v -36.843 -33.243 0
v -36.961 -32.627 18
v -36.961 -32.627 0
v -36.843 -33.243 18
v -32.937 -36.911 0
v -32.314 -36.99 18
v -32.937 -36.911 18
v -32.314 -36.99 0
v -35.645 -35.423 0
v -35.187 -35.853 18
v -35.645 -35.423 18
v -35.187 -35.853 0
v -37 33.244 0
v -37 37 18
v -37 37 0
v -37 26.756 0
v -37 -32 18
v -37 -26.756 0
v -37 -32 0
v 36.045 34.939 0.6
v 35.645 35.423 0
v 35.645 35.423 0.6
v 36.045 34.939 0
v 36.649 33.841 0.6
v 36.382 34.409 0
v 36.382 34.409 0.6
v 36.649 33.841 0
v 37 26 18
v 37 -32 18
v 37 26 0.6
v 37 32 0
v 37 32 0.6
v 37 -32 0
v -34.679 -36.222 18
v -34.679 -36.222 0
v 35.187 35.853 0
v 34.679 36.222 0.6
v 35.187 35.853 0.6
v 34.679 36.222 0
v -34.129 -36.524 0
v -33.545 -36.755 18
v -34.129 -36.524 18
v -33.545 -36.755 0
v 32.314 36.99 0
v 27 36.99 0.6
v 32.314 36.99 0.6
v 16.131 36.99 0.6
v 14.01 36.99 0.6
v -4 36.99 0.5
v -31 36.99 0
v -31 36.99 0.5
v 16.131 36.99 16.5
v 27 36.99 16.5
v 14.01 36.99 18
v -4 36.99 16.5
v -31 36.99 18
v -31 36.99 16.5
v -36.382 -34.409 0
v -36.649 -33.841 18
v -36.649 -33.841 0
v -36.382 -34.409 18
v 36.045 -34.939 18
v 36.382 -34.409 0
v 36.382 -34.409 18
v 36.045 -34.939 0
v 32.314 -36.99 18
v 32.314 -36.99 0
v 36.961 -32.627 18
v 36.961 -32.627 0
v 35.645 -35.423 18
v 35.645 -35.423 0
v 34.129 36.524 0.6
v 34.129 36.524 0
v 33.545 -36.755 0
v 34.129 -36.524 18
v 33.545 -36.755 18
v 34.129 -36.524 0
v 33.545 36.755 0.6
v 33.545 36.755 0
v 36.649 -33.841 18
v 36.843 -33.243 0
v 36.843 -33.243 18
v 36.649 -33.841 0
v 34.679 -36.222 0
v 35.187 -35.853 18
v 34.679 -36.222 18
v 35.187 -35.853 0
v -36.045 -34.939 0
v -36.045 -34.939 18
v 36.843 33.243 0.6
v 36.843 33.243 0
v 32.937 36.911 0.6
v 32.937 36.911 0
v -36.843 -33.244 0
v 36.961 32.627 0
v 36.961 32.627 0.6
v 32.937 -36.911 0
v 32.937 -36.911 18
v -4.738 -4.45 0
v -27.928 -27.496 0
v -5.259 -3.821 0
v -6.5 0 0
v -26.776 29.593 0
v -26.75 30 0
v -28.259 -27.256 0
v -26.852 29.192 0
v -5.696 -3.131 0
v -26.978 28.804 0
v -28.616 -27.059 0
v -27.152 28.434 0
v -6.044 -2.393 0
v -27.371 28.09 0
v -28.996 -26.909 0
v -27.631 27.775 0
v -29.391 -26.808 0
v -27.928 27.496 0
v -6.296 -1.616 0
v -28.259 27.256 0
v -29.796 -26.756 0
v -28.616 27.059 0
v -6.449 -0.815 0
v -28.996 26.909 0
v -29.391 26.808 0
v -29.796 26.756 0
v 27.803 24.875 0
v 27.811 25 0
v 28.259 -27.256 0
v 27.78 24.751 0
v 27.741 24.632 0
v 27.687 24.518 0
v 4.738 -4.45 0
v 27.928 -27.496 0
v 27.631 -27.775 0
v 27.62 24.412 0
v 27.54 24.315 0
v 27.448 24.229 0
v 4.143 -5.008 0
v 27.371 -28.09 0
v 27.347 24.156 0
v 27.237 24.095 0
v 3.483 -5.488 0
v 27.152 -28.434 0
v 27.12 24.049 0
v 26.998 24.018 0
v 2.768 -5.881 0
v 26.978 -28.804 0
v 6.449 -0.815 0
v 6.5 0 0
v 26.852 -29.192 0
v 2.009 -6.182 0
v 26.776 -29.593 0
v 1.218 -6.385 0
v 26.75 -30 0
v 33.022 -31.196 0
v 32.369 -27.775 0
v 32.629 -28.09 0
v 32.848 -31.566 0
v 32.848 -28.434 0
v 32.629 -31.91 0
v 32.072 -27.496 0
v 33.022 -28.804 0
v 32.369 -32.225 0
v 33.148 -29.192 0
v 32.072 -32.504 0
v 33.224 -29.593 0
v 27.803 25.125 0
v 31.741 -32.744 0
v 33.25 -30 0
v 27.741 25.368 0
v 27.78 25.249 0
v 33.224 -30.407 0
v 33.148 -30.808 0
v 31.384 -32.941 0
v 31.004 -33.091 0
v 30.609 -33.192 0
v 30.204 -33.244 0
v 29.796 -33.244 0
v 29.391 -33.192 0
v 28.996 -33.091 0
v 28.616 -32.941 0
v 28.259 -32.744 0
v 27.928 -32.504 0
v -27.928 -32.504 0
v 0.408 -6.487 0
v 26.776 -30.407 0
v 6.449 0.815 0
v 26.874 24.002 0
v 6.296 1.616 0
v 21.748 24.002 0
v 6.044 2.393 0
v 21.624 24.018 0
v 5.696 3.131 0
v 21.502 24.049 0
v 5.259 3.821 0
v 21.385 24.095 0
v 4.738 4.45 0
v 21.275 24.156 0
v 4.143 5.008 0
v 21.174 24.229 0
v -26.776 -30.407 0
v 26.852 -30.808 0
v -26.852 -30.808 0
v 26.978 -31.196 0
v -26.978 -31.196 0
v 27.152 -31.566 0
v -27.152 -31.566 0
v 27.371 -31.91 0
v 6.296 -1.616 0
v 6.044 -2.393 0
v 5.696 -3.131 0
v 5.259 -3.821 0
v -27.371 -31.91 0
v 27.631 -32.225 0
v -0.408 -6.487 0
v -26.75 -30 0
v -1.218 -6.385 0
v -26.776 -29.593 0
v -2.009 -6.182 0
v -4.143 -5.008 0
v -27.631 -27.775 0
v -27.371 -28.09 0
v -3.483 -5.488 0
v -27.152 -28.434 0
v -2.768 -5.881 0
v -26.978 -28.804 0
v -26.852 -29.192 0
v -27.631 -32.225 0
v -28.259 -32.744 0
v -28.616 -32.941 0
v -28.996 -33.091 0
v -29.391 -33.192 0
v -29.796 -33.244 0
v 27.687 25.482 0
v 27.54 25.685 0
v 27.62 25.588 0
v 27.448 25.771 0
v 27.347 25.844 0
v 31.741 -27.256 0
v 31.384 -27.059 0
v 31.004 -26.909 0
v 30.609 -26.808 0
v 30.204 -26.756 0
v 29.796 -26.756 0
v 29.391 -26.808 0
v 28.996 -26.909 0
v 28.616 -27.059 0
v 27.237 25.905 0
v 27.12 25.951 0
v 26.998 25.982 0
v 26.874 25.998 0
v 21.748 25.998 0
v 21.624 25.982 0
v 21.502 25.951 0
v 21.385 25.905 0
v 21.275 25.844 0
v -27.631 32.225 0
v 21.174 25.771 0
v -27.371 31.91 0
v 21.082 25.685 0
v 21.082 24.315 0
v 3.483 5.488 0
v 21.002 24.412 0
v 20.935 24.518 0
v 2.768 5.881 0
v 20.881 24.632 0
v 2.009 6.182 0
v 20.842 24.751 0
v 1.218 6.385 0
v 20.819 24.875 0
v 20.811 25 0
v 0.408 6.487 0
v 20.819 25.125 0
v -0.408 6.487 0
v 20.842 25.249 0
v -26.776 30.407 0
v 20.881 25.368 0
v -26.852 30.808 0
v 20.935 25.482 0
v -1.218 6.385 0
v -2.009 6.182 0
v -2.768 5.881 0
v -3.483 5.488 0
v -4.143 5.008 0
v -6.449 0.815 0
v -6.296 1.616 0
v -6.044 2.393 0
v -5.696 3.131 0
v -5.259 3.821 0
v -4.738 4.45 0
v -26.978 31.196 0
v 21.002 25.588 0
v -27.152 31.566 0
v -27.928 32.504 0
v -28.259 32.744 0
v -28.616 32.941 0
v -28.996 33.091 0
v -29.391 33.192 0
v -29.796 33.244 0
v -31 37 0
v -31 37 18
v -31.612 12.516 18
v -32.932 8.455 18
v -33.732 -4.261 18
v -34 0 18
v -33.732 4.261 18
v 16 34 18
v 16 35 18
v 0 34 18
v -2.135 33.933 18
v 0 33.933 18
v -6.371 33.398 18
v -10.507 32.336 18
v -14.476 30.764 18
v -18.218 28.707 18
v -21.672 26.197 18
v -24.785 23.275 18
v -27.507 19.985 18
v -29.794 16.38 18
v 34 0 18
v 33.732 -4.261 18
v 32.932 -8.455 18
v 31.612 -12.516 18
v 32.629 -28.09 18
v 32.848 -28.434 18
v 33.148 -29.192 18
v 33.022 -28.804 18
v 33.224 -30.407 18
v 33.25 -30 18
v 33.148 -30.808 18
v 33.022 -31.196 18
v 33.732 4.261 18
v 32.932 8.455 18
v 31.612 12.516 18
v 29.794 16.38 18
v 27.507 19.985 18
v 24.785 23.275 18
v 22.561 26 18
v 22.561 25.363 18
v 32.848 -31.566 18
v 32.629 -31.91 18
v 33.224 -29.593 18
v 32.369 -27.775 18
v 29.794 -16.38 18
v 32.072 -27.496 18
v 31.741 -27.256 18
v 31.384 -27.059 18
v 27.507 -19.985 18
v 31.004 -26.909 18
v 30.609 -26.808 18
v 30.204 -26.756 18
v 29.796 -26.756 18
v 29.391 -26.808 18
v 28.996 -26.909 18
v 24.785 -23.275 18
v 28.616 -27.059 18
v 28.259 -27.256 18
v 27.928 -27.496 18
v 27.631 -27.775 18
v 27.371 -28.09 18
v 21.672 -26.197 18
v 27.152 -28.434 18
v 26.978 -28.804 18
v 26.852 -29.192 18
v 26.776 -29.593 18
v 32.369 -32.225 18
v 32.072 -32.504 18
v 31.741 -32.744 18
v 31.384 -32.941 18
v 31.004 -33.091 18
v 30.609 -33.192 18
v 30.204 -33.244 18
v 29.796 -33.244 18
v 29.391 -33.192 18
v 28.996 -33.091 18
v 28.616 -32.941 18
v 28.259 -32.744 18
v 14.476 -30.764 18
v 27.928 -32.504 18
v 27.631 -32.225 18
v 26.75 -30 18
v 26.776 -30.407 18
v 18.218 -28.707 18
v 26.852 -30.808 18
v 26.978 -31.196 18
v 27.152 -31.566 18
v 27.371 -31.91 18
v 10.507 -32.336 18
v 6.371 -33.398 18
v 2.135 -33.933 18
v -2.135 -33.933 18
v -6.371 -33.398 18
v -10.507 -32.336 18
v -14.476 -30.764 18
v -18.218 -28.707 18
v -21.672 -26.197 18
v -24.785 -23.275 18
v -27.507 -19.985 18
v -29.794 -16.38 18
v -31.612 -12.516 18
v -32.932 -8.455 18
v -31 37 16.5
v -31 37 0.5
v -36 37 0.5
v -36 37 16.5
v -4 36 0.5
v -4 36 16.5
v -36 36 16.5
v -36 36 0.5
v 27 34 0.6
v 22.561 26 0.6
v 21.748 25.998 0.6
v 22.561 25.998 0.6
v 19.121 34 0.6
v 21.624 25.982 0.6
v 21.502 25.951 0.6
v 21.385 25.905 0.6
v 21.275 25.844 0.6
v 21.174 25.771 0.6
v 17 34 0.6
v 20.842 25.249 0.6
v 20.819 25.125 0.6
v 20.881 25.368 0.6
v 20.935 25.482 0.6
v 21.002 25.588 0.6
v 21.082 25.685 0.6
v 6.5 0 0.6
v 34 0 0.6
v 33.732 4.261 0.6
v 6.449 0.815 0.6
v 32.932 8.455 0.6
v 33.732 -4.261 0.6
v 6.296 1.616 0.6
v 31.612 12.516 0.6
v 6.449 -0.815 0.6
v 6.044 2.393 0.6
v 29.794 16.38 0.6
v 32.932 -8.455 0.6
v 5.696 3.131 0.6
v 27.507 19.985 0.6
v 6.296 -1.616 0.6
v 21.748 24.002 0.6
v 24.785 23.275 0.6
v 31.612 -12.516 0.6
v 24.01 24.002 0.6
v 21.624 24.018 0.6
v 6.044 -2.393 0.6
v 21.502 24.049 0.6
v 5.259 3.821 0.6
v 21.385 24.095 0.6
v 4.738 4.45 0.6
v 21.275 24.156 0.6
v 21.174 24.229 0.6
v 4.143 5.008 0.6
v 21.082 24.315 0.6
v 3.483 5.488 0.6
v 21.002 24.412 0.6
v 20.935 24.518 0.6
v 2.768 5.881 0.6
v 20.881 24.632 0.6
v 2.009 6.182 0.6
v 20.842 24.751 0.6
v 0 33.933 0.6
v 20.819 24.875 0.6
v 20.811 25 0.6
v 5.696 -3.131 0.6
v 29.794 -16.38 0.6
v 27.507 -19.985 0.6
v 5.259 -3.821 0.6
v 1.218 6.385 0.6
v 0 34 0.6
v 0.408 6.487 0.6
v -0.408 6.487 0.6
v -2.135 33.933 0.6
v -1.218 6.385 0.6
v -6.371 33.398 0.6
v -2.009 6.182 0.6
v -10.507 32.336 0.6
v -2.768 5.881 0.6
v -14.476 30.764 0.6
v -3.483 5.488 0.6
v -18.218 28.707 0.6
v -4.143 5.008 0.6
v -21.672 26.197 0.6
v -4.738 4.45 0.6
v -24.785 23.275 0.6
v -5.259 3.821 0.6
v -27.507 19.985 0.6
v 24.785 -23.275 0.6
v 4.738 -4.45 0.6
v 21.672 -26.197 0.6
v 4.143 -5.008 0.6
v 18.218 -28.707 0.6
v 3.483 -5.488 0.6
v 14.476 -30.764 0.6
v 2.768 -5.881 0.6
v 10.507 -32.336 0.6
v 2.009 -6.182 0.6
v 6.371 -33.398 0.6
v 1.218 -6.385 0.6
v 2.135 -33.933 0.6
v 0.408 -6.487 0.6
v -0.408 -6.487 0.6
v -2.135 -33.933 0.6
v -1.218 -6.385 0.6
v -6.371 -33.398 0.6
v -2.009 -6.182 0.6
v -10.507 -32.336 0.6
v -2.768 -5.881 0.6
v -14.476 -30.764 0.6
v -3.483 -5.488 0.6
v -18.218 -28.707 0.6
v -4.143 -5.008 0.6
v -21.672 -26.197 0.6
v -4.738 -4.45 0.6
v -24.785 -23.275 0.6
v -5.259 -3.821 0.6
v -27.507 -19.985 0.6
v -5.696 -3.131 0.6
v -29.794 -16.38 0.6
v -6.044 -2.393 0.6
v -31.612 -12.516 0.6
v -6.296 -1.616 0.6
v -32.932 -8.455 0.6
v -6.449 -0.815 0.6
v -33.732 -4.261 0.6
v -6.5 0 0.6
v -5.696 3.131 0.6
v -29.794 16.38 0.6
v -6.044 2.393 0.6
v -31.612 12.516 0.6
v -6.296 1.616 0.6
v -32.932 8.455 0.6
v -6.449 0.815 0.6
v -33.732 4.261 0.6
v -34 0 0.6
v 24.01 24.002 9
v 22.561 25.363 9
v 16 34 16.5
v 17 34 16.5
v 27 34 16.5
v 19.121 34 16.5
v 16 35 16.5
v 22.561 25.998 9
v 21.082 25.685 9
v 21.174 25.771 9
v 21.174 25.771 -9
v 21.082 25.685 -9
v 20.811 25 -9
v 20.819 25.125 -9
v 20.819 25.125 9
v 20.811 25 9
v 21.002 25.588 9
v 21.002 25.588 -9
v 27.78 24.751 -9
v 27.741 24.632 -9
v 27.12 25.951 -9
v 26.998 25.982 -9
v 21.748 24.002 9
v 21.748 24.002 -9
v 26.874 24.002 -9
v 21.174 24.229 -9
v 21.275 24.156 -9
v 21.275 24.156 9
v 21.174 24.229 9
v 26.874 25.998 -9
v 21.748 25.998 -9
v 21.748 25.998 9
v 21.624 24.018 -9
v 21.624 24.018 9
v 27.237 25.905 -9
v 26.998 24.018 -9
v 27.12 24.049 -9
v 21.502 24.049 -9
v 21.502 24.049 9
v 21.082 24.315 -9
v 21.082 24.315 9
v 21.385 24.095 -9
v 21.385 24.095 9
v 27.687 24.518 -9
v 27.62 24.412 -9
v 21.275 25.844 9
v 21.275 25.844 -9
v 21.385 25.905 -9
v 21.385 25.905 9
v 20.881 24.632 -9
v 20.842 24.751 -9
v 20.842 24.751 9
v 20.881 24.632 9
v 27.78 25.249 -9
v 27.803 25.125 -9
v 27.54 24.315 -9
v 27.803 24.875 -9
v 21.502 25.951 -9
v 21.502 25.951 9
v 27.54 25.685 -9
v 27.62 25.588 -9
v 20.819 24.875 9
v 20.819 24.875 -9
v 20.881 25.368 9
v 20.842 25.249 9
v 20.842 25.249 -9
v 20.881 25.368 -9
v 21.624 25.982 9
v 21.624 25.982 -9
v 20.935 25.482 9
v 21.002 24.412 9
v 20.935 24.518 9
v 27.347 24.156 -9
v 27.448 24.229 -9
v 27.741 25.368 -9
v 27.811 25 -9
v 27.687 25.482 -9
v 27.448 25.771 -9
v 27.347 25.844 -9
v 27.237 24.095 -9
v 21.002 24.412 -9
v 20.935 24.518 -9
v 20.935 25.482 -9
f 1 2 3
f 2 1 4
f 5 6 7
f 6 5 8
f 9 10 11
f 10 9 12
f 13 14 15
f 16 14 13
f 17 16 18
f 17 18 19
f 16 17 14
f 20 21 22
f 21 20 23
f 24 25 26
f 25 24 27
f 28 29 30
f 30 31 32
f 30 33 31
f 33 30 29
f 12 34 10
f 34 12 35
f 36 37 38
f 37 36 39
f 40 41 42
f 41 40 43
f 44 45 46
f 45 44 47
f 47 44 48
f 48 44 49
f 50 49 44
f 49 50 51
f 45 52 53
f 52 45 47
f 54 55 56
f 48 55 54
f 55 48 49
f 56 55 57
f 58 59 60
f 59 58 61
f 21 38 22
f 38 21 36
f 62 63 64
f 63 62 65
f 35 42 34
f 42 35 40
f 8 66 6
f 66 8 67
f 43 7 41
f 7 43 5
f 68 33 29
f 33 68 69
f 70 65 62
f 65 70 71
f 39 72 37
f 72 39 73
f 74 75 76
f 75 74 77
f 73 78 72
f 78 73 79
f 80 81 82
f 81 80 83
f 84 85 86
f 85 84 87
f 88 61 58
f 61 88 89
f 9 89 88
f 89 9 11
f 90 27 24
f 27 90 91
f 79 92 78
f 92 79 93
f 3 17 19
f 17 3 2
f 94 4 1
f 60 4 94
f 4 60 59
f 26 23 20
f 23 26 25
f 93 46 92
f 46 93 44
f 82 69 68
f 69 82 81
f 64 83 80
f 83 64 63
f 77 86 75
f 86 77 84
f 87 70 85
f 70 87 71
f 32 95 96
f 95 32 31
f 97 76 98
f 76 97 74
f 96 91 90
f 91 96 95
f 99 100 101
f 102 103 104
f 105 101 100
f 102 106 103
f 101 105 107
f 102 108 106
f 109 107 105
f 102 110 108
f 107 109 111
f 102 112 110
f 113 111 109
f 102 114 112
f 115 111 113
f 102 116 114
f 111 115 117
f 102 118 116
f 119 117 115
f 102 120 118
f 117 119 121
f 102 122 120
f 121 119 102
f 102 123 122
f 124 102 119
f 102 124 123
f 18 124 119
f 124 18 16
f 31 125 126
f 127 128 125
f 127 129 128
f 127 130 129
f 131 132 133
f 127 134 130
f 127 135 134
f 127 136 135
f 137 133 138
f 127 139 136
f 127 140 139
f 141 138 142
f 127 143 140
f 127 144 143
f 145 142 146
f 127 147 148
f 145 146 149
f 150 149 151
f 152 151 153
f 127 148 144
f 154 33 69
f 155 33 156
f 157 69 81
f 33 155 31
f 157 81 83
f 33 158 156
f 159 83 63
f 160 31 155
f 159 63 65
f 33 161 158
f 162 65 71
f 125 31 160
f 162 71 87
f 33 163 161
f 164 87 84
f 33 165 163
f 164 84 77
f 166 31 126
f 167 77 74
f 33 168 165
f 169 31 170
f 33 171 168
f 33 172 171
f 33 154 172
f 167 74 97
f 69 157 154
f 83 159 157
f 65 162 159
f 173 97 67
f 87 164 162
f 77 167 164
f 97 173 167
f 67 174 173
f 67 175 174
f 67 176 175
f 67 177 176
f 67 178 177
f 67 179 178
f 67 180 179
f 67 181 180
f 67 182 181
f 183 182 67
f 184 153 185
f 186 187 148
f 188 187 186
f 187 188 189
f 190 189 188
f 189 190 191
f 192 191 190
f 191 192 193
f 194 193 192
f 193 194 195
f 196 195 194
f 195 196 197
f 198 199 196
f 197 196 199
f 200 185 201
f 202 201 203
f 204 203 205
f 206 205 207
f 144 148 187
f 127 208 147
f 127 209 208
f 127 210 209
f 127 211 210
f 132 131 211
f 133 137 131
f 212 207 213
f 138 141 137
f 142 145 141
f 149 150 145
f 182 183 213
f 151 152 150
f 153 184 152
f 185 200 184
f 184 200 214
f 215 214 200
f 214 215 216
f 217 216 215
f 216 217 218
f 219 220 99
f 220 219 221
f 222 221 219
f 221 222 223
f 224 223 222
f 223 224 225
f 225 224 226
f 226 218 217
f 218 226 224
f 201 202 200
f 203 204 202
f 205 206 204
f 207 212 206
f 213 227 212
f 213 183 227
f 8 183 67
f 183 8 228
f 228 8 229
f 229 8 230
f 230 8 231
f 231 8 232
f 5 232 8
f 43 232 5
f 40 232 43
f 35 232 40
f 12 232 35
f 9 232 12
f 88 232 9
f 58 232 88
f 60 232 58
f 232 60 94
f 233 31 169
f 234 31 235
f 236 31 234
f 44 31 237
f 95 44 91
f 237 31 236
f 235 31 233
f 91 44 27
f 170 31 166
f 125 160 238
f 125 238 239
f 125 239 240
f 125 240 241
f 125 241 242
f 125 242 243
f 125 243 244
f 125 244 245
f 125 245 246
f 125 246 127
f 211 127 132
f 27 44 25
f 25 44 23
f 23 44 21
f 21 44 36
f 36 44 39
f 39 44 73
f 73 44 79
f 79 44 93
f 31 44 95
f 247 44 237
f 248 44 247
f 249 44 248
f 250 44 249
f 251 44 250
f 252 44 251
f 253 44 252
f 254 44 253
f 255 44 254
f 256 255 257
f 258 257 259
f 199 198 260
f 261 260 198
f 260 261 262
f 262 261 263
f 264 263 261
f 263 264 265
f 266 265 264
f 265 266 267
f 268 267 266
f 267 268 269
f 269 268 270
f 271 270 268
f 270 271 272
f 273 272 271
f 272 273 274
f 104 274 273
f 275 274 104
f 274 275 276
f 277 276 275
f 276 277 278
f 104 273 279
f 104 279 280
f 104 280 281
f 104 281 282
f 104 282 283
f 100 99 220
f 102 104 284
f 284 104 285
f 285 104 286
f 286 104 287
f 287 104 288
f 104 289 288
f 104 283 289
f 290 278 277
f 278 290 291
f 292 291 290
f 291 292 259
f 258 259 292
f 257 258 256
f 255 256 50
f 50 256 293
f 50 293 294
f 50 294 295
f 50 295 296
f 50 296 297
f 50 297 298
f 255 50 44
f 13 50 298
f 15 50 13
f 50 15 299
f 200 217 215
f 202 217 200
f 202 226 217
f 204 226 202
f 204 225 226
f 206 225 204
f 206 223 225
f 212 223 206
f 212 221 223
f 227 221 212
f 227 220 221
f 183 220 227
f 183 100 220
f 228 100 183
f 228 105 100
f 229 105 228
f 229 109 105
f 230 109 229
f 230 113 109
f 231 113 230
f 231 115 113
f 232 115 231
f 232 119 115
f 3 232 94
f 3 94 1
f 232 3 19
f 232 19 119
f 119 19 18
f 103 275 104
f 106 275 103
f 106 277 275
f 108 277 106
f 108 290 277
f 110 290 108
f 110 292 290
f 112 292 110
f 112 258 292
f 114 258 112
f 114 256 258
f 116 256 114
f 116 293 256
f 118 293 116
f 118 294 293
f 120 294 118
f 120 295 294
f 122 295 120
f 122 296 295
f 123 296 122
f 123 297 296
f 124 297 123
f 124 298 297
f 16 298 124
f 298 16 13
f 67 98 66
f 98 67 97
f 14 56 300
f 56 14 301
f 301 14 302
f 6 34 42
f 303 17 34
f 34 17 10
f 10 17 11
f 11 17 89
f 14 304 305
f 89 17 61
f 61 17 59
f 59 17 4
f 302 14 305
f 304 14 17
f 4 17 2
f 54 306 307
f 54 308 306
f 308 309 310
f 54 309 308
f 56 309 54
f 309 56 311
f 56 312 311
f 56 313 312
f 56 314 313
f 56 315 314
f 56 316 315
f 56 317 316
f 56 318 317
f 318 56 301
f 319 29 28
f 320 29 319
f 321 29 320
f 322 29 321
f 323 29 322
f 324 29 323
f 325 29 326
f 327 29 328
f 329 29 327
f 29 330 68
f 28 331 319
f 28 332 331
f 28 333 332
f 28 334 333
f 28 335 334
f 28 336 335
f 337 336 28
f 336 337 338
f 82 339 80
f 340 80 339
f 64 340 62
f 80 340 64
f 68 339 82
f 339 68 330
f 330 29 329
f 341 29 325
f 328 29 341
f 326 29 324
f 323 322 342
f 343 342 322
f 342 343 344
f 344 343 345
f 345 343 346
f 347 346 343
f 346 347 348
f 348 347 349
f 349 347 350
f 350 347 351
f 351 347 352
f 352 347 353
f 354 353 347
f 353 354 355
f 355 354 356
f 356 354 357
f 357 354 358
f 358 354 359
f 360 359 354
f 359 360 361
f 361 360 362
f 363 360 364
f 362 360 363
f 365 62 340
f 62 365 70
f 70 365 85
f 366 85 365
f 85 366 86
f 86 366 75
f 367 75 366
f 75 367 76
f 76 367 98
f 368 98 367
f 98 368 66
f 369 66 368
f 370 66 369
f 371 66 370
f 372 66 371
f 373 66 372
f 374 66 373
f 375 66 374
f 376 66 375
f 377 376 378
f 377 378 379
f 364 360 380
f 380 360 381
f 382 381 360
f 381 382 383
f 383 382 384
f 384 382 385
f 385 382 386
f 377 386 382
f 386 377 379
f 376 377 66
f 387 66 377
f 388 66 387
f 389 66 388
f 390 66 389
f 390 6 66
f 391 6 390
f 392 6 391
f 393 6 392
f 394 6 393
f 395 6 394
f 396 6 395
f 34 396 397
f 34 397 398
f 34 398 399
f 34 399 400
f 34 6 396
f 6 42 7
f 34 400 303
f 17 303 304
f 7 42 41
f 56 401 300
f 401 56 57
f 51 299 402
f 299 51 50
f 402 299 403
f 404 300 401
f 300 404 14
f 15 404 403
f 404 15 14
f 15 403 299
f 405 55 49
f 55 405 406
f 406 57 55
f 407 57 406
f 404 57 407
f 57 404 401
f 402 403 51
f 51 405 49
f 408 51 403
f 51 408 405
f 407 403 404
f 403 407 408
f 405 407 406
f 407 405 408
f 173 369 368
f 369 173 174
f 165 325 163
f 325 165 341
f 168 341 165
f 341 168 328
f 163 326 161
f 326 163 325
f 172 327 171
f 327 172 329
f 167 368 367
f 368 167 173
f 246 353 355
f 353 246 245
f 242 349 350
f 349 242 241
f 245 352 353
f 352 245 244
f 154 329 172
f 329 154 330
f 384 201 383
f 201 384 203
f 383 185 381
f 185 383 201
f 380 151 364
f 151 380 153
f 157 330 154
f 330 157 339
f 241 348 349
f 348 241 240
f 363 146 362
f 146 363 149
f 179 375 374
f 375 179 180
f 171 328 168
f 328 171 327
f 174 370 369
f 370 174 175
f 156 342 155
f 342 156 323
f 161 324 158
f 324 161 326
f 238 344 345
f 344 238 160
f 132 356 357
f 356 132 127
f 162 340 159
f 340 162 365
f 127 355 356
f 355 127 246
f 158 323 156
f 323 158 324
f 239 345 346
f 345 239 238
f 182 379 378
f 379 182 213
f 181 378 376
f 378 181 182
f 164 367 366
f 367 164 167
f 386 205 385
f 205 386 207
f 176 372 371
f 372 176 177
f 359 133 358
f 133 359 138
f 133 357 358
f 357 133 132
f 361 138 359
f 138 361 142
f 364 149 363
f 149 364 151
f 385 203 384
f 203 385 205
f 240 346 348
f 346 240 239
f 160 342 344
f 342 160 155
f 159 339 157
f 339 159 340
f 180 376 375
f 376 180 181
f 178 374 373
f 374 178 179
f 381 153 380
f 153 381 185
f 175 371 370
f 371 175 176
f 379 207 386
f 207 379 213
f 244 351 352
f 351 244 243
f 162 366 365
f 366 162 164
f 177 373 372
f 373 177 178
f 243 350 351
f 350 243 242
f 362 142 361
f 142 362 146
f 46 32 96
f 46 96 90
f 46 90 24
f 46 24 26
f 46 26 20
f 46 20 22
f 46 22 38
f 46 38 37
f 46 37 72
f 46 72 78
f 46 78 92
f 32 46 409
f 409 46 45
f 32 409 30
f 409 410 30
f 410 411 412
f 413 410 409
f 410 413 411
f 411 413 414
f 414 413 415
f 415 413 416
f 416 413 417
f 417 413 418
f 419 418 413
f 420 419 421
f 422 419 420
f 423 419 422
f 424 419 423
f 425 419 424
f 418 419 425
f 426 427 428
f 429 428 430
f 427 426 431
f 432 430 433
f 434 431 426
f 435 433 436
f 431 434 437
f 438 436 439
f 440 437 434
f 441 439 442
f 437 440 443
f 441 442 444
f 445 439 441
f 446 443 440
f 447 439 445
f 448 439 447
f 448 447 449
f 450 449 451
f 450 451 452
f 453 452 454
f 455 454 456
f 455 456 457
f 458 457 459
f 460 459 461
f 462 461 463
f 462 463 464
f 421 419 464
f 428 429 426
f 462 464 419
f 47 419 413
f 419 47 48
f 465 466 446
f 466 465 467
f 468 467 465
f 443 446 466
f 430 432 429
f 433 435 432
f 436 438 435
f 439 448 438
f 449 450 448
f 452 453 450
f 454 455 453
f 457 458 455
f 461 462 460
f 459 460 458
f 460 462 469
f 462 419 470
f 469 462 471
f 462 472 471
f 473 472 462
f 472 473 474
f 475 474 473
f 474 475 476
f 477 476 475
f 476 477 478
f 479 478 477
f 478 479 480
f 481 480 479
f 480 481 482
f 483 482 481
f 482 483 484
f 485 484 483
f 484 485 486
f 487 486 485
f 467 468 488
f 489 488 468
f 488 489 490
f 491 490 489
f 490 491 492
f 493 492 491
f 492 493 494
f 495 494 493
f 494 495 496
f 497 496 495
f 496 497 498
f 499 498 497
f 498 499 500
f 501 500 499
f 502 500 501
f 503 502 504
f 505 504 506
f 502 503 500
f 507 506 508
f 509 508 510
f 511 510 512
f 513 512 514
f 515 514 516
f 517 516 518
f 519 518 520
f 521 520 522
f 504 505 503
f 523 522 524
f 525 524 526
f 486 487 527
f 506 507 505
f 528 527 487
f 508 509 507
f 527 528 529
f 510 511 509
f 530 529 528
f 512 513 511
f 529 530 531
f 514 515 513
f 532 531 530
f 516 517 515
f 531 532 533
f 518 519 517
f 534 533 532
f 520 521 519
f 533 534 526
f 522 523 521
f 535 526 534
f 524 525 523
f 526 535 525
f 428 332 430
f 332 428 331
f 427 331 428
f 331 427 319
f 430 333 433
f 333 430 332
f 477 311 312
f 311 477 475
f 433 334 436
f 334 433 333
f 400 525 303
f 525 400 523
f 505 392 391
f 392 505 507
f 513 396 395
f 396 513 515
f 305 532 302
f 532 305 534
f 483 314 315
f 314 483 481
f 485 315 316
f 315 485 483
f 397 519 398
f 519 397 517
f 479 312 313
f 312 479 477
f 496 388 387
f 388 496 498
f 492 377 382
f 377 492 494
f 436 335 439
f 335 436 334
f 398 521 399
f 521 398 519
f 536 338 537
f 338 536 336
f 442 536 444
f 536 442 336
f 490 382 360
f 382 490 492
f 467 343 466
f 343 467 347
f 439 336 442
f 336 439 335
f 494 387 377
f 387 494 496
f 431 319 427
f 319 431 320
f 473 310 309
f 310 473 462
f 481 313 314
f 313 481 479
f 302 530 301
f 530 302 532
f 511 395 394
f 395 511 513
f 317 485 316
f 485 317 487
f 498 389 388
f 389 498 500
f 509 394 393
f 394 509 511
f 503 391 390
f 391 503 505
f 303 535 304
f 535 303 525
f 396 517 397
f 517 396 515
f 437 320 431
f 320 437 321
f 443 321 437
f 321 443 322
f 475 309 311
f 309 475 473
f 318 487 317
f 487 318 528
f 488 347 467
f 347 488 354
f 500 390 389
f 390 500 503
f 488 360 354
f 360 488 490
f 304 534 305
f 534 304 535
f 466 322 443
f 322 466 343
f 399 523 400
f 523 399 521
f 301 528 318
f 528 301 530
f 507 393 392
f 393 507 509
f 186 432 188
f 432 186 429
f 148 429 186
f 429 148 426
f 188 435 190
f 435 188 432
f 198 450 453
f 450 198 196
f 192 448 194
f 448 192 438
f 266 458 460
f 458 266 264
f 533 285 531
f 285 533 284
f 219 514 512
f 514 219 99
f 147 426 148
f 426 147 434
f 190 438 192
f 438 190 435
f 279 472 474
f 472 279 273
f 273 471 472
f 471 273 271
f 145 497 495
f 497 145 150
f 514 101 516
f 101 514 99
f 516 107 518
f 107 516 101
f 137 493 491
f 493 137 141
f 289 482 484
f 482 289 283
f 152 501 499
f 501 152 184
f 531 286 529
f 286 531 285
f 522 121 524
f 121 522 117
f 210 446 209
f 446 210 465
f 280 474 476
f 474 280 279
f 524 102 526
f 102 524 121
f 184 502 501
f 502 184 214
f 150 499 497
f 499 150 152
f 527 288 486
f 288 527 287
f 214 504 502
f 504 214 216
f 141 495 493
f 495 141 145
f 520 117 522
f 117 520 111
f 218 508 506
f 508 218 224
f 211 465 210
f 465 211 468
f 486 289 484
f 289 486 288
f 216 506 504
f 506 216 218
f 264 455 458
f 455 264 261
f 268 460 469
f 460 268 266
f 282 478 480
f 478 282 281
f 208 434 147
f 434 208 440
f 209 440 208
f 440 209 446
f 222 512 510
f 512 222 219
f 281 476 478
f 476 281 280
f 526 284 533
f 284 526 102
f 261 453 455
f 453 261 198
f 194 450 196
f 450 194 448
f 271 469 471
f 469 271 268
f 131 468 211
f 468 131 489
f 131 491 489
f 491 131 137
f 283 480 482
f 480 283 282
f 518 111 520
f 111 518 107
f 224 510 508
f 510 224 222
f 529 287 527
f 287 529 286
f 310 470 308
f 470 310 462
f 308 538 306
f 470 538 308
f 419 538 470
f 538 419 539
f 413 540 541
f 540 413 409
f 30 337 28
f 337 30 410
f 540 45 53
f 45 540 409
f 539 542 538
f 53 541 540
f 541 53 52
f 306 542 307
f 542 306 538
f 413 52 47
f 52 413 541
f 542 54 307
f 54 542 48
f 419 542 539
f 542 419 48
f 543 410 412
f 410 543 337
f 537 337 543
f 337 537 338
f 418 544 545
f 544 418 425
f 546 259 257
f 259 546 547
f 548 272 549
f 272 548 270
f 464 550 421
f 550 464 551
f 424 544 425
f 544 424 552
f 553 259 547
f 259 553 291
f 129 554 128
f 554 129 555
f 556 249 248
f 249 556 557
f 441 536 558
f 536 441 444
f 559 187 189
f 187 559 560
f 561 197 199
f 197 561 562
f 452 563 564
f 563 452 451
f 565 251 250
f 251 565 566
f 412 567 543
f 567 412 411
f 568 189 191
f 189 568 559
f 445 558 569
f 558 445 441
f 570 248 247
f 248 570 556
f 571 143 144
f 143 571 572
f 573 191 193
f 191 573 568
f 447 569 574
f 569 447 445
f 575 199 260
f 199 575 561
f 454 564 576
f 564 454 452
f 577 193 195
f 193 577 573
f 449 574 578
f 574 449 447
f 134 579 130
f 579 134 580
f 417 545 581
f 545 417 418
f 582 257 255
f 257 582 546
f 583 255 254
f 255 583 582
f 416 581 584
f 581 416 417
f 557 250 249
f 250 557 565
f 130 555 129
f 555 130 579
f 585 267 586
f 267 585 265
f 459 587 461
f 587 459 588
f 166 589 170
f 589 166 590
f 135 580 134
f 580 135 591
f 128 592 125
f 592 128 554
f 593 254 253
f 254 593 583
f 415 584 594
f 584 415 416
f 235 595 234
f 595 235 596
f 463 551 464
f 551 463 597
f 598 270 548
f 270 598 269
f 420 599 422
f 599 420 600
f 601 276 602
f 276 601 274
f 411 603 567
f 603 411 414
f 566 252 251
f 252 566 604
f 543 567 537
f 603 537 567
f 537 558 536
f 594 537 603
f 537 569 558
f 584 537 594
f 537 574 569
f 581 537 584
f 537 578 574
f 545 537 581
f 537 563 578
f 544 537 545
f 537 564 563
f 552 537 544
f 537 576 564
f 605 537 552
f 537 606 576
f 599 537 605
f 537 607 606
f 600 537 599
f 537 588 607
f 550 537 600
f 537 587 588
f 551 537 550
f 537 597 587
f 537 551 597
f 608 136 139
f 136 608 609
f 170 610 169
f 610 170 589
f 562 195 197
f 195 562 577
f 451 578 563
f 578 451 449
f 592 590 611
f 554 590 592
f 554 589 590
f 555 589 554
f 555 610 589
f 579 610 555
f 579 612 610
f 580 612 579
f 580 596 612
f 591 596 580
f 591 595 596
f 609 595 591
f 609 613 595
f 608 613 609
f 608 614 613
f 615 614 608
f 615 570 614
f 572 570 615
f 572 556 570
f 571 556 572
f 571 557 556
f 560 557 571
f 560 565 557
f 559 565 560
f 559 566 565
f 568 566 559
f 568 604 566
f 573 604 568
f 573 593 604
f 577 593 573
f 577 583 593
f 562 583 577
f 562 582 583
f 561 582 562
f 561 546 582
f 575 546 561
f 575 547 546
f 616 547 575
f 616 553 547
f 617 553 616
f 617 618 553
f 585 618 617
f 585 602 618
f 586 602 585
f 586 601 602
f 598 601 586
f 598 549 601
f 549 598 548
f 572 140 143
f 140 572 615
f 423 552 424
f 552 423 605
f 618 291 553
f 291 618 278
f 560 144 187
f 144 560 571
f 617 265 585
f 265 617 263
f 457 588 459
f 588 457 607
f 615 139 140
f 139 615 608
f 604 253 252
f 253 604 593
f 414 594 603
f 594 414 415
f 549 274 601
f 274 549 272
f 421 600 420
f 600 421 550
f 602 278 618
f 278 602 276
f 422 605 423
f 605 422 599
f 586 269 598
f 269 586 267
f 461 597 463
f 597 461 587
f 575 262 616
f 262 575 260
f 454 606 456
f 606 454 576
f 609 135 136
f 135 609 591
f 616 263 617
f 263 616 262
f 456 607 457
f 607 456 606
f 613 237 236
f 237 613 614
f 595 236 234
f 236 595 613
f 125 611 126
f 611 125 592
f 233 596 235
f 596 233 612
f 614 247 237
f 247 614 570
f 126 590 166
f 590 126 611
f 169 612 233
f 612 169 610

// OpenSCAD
$fn = 50;


union() {
	difference() {
		union() {
			hull() {
				translate(v = [-32.0000000000, 32.0000000000, 0]) {
					cylinder(h = 18, r = 5);
				}
				translate(v = [32.0000000000, 32.0000000000, 0]) {
					cylinder(h = 18, r = 5);
				}
				translate(v = [-32.0000000000, -32.0000000000, 0]) {
					cylinder(h = 18, r = 5);
				}
				translate(v = [32.0000000000, -32.0000000000, 0]) {
					cylinder(h = 18, r = 5);
				}
			}
			translate(v = [-37.0000000000, 31.0000000000, 0]) {
				cube(size = [6, 6, 18]);
			}
		}
		union() {
			translate(v = [-37.5000000000, -30.0000000000, -250.0000000000]) {
				rotate(a = [0, 0, 0]) {
					difference() {
						union() {
							hull() {
								translate(v = [7.5000000000, 0, 0]) {
									cylinder(h = 250, r = 3.2500000000, r1 = 3.2500000000, r2 = 3.2500000000);
								}
								translate(v = [-7.5000000000, 0, 0]) {
									cylinder(h = 250, r = 3.2500000000, r1 = 3.2500000000, r2 = 3.2500000000);
								}
							}
						}
						union();
					}
				}
			}
			translate(v = [-37.5000000000, 30.0000000000, -250.0000000000]) {
				rotate(a = [0, 0, 0]) {
					difference() {
						union() {
							hull() {
								translate(v = [7.5000000000, 0, 0]) {
									cylinder(h = 250, r = 3.2500000000, r1 = 3.2500000000, r2 = 3.2500000000);
								}
								translate(v = [-7.5000000000, 0, 0]) {
									cylinder(h = 250, r = 3.2500000000, r1 = 3.2500000000, r2 = 3.2500000000);
								}
							}
						}
						union();
					}
				}
			}
			translate(v = [-36.0000000000, 36.0000000000, 0.5000000000]) {
				cube(size = [32, 1, 16]);
			}
			translate(v = [30.0000000000, -30.0000000000, 0]) {
				cylinder(h = 100, r = 3.2500000000);
			}
			translate(v = [0, 0, 0.6000000000]) {
				cylinder(h = 20.4000000000, r = 34.0000000000);
			}
			translate(v = [0, 0, -9.0000000000]) {
				cylinder(h = 18, r = 6.5000000000);
			}
			translate(v = [0.0000000000, 26.0000000000, 0.6000000000]) {
				cube(size = [37.0000000000, 8, 20.4000000000]);
			}
			translate(v = [27.0000000000, 26.0000000000, 0.6000000000]) {
				cube(size = [10, 11, 20.4000000000]);
			}
			translate(v = [16.0000000000, 26.0000000000, 16.5000000000]) {
				cube(size = [21, 11, 1.5000000000]);
			}
			translate(v = [13.2500000000, 37.7500000000, 0.6000000000]) {
				rotate(a = [0, 0, -45]) {
					cube(size = [7.5000000000, 1.5000000000, 20.4000000000]);
				}
			}
			translate(v = [15.0610000000, 24.0000000000, 0.6000000000]) {
				cube(size = [7.5000000000, 2, 17.4000000000]);
			}
		}
	}
	union() {
		translate(v = [24.3110000000, 25.0000000000, -9.0000000000]) {
			rotate(a = [0, 0, 0]) {
				difference() {
					union() {
						#hull() {
							#translate(v = [2.5000000000, 0, 0]) {
								cylinder(h = 18, r = 1.0000000000, r1 = 1.0000000000, r2 = 1.0000000000);
							}
							#translate(v = [-2.5000000000, 0, 0]) {
								cylinder(h = 18, r = 1.0000000000, r1 = 1.0000000000, r2 = 1.0000000000);
							}
						}
					}
					union();
				}
			}
		}
	}
}
